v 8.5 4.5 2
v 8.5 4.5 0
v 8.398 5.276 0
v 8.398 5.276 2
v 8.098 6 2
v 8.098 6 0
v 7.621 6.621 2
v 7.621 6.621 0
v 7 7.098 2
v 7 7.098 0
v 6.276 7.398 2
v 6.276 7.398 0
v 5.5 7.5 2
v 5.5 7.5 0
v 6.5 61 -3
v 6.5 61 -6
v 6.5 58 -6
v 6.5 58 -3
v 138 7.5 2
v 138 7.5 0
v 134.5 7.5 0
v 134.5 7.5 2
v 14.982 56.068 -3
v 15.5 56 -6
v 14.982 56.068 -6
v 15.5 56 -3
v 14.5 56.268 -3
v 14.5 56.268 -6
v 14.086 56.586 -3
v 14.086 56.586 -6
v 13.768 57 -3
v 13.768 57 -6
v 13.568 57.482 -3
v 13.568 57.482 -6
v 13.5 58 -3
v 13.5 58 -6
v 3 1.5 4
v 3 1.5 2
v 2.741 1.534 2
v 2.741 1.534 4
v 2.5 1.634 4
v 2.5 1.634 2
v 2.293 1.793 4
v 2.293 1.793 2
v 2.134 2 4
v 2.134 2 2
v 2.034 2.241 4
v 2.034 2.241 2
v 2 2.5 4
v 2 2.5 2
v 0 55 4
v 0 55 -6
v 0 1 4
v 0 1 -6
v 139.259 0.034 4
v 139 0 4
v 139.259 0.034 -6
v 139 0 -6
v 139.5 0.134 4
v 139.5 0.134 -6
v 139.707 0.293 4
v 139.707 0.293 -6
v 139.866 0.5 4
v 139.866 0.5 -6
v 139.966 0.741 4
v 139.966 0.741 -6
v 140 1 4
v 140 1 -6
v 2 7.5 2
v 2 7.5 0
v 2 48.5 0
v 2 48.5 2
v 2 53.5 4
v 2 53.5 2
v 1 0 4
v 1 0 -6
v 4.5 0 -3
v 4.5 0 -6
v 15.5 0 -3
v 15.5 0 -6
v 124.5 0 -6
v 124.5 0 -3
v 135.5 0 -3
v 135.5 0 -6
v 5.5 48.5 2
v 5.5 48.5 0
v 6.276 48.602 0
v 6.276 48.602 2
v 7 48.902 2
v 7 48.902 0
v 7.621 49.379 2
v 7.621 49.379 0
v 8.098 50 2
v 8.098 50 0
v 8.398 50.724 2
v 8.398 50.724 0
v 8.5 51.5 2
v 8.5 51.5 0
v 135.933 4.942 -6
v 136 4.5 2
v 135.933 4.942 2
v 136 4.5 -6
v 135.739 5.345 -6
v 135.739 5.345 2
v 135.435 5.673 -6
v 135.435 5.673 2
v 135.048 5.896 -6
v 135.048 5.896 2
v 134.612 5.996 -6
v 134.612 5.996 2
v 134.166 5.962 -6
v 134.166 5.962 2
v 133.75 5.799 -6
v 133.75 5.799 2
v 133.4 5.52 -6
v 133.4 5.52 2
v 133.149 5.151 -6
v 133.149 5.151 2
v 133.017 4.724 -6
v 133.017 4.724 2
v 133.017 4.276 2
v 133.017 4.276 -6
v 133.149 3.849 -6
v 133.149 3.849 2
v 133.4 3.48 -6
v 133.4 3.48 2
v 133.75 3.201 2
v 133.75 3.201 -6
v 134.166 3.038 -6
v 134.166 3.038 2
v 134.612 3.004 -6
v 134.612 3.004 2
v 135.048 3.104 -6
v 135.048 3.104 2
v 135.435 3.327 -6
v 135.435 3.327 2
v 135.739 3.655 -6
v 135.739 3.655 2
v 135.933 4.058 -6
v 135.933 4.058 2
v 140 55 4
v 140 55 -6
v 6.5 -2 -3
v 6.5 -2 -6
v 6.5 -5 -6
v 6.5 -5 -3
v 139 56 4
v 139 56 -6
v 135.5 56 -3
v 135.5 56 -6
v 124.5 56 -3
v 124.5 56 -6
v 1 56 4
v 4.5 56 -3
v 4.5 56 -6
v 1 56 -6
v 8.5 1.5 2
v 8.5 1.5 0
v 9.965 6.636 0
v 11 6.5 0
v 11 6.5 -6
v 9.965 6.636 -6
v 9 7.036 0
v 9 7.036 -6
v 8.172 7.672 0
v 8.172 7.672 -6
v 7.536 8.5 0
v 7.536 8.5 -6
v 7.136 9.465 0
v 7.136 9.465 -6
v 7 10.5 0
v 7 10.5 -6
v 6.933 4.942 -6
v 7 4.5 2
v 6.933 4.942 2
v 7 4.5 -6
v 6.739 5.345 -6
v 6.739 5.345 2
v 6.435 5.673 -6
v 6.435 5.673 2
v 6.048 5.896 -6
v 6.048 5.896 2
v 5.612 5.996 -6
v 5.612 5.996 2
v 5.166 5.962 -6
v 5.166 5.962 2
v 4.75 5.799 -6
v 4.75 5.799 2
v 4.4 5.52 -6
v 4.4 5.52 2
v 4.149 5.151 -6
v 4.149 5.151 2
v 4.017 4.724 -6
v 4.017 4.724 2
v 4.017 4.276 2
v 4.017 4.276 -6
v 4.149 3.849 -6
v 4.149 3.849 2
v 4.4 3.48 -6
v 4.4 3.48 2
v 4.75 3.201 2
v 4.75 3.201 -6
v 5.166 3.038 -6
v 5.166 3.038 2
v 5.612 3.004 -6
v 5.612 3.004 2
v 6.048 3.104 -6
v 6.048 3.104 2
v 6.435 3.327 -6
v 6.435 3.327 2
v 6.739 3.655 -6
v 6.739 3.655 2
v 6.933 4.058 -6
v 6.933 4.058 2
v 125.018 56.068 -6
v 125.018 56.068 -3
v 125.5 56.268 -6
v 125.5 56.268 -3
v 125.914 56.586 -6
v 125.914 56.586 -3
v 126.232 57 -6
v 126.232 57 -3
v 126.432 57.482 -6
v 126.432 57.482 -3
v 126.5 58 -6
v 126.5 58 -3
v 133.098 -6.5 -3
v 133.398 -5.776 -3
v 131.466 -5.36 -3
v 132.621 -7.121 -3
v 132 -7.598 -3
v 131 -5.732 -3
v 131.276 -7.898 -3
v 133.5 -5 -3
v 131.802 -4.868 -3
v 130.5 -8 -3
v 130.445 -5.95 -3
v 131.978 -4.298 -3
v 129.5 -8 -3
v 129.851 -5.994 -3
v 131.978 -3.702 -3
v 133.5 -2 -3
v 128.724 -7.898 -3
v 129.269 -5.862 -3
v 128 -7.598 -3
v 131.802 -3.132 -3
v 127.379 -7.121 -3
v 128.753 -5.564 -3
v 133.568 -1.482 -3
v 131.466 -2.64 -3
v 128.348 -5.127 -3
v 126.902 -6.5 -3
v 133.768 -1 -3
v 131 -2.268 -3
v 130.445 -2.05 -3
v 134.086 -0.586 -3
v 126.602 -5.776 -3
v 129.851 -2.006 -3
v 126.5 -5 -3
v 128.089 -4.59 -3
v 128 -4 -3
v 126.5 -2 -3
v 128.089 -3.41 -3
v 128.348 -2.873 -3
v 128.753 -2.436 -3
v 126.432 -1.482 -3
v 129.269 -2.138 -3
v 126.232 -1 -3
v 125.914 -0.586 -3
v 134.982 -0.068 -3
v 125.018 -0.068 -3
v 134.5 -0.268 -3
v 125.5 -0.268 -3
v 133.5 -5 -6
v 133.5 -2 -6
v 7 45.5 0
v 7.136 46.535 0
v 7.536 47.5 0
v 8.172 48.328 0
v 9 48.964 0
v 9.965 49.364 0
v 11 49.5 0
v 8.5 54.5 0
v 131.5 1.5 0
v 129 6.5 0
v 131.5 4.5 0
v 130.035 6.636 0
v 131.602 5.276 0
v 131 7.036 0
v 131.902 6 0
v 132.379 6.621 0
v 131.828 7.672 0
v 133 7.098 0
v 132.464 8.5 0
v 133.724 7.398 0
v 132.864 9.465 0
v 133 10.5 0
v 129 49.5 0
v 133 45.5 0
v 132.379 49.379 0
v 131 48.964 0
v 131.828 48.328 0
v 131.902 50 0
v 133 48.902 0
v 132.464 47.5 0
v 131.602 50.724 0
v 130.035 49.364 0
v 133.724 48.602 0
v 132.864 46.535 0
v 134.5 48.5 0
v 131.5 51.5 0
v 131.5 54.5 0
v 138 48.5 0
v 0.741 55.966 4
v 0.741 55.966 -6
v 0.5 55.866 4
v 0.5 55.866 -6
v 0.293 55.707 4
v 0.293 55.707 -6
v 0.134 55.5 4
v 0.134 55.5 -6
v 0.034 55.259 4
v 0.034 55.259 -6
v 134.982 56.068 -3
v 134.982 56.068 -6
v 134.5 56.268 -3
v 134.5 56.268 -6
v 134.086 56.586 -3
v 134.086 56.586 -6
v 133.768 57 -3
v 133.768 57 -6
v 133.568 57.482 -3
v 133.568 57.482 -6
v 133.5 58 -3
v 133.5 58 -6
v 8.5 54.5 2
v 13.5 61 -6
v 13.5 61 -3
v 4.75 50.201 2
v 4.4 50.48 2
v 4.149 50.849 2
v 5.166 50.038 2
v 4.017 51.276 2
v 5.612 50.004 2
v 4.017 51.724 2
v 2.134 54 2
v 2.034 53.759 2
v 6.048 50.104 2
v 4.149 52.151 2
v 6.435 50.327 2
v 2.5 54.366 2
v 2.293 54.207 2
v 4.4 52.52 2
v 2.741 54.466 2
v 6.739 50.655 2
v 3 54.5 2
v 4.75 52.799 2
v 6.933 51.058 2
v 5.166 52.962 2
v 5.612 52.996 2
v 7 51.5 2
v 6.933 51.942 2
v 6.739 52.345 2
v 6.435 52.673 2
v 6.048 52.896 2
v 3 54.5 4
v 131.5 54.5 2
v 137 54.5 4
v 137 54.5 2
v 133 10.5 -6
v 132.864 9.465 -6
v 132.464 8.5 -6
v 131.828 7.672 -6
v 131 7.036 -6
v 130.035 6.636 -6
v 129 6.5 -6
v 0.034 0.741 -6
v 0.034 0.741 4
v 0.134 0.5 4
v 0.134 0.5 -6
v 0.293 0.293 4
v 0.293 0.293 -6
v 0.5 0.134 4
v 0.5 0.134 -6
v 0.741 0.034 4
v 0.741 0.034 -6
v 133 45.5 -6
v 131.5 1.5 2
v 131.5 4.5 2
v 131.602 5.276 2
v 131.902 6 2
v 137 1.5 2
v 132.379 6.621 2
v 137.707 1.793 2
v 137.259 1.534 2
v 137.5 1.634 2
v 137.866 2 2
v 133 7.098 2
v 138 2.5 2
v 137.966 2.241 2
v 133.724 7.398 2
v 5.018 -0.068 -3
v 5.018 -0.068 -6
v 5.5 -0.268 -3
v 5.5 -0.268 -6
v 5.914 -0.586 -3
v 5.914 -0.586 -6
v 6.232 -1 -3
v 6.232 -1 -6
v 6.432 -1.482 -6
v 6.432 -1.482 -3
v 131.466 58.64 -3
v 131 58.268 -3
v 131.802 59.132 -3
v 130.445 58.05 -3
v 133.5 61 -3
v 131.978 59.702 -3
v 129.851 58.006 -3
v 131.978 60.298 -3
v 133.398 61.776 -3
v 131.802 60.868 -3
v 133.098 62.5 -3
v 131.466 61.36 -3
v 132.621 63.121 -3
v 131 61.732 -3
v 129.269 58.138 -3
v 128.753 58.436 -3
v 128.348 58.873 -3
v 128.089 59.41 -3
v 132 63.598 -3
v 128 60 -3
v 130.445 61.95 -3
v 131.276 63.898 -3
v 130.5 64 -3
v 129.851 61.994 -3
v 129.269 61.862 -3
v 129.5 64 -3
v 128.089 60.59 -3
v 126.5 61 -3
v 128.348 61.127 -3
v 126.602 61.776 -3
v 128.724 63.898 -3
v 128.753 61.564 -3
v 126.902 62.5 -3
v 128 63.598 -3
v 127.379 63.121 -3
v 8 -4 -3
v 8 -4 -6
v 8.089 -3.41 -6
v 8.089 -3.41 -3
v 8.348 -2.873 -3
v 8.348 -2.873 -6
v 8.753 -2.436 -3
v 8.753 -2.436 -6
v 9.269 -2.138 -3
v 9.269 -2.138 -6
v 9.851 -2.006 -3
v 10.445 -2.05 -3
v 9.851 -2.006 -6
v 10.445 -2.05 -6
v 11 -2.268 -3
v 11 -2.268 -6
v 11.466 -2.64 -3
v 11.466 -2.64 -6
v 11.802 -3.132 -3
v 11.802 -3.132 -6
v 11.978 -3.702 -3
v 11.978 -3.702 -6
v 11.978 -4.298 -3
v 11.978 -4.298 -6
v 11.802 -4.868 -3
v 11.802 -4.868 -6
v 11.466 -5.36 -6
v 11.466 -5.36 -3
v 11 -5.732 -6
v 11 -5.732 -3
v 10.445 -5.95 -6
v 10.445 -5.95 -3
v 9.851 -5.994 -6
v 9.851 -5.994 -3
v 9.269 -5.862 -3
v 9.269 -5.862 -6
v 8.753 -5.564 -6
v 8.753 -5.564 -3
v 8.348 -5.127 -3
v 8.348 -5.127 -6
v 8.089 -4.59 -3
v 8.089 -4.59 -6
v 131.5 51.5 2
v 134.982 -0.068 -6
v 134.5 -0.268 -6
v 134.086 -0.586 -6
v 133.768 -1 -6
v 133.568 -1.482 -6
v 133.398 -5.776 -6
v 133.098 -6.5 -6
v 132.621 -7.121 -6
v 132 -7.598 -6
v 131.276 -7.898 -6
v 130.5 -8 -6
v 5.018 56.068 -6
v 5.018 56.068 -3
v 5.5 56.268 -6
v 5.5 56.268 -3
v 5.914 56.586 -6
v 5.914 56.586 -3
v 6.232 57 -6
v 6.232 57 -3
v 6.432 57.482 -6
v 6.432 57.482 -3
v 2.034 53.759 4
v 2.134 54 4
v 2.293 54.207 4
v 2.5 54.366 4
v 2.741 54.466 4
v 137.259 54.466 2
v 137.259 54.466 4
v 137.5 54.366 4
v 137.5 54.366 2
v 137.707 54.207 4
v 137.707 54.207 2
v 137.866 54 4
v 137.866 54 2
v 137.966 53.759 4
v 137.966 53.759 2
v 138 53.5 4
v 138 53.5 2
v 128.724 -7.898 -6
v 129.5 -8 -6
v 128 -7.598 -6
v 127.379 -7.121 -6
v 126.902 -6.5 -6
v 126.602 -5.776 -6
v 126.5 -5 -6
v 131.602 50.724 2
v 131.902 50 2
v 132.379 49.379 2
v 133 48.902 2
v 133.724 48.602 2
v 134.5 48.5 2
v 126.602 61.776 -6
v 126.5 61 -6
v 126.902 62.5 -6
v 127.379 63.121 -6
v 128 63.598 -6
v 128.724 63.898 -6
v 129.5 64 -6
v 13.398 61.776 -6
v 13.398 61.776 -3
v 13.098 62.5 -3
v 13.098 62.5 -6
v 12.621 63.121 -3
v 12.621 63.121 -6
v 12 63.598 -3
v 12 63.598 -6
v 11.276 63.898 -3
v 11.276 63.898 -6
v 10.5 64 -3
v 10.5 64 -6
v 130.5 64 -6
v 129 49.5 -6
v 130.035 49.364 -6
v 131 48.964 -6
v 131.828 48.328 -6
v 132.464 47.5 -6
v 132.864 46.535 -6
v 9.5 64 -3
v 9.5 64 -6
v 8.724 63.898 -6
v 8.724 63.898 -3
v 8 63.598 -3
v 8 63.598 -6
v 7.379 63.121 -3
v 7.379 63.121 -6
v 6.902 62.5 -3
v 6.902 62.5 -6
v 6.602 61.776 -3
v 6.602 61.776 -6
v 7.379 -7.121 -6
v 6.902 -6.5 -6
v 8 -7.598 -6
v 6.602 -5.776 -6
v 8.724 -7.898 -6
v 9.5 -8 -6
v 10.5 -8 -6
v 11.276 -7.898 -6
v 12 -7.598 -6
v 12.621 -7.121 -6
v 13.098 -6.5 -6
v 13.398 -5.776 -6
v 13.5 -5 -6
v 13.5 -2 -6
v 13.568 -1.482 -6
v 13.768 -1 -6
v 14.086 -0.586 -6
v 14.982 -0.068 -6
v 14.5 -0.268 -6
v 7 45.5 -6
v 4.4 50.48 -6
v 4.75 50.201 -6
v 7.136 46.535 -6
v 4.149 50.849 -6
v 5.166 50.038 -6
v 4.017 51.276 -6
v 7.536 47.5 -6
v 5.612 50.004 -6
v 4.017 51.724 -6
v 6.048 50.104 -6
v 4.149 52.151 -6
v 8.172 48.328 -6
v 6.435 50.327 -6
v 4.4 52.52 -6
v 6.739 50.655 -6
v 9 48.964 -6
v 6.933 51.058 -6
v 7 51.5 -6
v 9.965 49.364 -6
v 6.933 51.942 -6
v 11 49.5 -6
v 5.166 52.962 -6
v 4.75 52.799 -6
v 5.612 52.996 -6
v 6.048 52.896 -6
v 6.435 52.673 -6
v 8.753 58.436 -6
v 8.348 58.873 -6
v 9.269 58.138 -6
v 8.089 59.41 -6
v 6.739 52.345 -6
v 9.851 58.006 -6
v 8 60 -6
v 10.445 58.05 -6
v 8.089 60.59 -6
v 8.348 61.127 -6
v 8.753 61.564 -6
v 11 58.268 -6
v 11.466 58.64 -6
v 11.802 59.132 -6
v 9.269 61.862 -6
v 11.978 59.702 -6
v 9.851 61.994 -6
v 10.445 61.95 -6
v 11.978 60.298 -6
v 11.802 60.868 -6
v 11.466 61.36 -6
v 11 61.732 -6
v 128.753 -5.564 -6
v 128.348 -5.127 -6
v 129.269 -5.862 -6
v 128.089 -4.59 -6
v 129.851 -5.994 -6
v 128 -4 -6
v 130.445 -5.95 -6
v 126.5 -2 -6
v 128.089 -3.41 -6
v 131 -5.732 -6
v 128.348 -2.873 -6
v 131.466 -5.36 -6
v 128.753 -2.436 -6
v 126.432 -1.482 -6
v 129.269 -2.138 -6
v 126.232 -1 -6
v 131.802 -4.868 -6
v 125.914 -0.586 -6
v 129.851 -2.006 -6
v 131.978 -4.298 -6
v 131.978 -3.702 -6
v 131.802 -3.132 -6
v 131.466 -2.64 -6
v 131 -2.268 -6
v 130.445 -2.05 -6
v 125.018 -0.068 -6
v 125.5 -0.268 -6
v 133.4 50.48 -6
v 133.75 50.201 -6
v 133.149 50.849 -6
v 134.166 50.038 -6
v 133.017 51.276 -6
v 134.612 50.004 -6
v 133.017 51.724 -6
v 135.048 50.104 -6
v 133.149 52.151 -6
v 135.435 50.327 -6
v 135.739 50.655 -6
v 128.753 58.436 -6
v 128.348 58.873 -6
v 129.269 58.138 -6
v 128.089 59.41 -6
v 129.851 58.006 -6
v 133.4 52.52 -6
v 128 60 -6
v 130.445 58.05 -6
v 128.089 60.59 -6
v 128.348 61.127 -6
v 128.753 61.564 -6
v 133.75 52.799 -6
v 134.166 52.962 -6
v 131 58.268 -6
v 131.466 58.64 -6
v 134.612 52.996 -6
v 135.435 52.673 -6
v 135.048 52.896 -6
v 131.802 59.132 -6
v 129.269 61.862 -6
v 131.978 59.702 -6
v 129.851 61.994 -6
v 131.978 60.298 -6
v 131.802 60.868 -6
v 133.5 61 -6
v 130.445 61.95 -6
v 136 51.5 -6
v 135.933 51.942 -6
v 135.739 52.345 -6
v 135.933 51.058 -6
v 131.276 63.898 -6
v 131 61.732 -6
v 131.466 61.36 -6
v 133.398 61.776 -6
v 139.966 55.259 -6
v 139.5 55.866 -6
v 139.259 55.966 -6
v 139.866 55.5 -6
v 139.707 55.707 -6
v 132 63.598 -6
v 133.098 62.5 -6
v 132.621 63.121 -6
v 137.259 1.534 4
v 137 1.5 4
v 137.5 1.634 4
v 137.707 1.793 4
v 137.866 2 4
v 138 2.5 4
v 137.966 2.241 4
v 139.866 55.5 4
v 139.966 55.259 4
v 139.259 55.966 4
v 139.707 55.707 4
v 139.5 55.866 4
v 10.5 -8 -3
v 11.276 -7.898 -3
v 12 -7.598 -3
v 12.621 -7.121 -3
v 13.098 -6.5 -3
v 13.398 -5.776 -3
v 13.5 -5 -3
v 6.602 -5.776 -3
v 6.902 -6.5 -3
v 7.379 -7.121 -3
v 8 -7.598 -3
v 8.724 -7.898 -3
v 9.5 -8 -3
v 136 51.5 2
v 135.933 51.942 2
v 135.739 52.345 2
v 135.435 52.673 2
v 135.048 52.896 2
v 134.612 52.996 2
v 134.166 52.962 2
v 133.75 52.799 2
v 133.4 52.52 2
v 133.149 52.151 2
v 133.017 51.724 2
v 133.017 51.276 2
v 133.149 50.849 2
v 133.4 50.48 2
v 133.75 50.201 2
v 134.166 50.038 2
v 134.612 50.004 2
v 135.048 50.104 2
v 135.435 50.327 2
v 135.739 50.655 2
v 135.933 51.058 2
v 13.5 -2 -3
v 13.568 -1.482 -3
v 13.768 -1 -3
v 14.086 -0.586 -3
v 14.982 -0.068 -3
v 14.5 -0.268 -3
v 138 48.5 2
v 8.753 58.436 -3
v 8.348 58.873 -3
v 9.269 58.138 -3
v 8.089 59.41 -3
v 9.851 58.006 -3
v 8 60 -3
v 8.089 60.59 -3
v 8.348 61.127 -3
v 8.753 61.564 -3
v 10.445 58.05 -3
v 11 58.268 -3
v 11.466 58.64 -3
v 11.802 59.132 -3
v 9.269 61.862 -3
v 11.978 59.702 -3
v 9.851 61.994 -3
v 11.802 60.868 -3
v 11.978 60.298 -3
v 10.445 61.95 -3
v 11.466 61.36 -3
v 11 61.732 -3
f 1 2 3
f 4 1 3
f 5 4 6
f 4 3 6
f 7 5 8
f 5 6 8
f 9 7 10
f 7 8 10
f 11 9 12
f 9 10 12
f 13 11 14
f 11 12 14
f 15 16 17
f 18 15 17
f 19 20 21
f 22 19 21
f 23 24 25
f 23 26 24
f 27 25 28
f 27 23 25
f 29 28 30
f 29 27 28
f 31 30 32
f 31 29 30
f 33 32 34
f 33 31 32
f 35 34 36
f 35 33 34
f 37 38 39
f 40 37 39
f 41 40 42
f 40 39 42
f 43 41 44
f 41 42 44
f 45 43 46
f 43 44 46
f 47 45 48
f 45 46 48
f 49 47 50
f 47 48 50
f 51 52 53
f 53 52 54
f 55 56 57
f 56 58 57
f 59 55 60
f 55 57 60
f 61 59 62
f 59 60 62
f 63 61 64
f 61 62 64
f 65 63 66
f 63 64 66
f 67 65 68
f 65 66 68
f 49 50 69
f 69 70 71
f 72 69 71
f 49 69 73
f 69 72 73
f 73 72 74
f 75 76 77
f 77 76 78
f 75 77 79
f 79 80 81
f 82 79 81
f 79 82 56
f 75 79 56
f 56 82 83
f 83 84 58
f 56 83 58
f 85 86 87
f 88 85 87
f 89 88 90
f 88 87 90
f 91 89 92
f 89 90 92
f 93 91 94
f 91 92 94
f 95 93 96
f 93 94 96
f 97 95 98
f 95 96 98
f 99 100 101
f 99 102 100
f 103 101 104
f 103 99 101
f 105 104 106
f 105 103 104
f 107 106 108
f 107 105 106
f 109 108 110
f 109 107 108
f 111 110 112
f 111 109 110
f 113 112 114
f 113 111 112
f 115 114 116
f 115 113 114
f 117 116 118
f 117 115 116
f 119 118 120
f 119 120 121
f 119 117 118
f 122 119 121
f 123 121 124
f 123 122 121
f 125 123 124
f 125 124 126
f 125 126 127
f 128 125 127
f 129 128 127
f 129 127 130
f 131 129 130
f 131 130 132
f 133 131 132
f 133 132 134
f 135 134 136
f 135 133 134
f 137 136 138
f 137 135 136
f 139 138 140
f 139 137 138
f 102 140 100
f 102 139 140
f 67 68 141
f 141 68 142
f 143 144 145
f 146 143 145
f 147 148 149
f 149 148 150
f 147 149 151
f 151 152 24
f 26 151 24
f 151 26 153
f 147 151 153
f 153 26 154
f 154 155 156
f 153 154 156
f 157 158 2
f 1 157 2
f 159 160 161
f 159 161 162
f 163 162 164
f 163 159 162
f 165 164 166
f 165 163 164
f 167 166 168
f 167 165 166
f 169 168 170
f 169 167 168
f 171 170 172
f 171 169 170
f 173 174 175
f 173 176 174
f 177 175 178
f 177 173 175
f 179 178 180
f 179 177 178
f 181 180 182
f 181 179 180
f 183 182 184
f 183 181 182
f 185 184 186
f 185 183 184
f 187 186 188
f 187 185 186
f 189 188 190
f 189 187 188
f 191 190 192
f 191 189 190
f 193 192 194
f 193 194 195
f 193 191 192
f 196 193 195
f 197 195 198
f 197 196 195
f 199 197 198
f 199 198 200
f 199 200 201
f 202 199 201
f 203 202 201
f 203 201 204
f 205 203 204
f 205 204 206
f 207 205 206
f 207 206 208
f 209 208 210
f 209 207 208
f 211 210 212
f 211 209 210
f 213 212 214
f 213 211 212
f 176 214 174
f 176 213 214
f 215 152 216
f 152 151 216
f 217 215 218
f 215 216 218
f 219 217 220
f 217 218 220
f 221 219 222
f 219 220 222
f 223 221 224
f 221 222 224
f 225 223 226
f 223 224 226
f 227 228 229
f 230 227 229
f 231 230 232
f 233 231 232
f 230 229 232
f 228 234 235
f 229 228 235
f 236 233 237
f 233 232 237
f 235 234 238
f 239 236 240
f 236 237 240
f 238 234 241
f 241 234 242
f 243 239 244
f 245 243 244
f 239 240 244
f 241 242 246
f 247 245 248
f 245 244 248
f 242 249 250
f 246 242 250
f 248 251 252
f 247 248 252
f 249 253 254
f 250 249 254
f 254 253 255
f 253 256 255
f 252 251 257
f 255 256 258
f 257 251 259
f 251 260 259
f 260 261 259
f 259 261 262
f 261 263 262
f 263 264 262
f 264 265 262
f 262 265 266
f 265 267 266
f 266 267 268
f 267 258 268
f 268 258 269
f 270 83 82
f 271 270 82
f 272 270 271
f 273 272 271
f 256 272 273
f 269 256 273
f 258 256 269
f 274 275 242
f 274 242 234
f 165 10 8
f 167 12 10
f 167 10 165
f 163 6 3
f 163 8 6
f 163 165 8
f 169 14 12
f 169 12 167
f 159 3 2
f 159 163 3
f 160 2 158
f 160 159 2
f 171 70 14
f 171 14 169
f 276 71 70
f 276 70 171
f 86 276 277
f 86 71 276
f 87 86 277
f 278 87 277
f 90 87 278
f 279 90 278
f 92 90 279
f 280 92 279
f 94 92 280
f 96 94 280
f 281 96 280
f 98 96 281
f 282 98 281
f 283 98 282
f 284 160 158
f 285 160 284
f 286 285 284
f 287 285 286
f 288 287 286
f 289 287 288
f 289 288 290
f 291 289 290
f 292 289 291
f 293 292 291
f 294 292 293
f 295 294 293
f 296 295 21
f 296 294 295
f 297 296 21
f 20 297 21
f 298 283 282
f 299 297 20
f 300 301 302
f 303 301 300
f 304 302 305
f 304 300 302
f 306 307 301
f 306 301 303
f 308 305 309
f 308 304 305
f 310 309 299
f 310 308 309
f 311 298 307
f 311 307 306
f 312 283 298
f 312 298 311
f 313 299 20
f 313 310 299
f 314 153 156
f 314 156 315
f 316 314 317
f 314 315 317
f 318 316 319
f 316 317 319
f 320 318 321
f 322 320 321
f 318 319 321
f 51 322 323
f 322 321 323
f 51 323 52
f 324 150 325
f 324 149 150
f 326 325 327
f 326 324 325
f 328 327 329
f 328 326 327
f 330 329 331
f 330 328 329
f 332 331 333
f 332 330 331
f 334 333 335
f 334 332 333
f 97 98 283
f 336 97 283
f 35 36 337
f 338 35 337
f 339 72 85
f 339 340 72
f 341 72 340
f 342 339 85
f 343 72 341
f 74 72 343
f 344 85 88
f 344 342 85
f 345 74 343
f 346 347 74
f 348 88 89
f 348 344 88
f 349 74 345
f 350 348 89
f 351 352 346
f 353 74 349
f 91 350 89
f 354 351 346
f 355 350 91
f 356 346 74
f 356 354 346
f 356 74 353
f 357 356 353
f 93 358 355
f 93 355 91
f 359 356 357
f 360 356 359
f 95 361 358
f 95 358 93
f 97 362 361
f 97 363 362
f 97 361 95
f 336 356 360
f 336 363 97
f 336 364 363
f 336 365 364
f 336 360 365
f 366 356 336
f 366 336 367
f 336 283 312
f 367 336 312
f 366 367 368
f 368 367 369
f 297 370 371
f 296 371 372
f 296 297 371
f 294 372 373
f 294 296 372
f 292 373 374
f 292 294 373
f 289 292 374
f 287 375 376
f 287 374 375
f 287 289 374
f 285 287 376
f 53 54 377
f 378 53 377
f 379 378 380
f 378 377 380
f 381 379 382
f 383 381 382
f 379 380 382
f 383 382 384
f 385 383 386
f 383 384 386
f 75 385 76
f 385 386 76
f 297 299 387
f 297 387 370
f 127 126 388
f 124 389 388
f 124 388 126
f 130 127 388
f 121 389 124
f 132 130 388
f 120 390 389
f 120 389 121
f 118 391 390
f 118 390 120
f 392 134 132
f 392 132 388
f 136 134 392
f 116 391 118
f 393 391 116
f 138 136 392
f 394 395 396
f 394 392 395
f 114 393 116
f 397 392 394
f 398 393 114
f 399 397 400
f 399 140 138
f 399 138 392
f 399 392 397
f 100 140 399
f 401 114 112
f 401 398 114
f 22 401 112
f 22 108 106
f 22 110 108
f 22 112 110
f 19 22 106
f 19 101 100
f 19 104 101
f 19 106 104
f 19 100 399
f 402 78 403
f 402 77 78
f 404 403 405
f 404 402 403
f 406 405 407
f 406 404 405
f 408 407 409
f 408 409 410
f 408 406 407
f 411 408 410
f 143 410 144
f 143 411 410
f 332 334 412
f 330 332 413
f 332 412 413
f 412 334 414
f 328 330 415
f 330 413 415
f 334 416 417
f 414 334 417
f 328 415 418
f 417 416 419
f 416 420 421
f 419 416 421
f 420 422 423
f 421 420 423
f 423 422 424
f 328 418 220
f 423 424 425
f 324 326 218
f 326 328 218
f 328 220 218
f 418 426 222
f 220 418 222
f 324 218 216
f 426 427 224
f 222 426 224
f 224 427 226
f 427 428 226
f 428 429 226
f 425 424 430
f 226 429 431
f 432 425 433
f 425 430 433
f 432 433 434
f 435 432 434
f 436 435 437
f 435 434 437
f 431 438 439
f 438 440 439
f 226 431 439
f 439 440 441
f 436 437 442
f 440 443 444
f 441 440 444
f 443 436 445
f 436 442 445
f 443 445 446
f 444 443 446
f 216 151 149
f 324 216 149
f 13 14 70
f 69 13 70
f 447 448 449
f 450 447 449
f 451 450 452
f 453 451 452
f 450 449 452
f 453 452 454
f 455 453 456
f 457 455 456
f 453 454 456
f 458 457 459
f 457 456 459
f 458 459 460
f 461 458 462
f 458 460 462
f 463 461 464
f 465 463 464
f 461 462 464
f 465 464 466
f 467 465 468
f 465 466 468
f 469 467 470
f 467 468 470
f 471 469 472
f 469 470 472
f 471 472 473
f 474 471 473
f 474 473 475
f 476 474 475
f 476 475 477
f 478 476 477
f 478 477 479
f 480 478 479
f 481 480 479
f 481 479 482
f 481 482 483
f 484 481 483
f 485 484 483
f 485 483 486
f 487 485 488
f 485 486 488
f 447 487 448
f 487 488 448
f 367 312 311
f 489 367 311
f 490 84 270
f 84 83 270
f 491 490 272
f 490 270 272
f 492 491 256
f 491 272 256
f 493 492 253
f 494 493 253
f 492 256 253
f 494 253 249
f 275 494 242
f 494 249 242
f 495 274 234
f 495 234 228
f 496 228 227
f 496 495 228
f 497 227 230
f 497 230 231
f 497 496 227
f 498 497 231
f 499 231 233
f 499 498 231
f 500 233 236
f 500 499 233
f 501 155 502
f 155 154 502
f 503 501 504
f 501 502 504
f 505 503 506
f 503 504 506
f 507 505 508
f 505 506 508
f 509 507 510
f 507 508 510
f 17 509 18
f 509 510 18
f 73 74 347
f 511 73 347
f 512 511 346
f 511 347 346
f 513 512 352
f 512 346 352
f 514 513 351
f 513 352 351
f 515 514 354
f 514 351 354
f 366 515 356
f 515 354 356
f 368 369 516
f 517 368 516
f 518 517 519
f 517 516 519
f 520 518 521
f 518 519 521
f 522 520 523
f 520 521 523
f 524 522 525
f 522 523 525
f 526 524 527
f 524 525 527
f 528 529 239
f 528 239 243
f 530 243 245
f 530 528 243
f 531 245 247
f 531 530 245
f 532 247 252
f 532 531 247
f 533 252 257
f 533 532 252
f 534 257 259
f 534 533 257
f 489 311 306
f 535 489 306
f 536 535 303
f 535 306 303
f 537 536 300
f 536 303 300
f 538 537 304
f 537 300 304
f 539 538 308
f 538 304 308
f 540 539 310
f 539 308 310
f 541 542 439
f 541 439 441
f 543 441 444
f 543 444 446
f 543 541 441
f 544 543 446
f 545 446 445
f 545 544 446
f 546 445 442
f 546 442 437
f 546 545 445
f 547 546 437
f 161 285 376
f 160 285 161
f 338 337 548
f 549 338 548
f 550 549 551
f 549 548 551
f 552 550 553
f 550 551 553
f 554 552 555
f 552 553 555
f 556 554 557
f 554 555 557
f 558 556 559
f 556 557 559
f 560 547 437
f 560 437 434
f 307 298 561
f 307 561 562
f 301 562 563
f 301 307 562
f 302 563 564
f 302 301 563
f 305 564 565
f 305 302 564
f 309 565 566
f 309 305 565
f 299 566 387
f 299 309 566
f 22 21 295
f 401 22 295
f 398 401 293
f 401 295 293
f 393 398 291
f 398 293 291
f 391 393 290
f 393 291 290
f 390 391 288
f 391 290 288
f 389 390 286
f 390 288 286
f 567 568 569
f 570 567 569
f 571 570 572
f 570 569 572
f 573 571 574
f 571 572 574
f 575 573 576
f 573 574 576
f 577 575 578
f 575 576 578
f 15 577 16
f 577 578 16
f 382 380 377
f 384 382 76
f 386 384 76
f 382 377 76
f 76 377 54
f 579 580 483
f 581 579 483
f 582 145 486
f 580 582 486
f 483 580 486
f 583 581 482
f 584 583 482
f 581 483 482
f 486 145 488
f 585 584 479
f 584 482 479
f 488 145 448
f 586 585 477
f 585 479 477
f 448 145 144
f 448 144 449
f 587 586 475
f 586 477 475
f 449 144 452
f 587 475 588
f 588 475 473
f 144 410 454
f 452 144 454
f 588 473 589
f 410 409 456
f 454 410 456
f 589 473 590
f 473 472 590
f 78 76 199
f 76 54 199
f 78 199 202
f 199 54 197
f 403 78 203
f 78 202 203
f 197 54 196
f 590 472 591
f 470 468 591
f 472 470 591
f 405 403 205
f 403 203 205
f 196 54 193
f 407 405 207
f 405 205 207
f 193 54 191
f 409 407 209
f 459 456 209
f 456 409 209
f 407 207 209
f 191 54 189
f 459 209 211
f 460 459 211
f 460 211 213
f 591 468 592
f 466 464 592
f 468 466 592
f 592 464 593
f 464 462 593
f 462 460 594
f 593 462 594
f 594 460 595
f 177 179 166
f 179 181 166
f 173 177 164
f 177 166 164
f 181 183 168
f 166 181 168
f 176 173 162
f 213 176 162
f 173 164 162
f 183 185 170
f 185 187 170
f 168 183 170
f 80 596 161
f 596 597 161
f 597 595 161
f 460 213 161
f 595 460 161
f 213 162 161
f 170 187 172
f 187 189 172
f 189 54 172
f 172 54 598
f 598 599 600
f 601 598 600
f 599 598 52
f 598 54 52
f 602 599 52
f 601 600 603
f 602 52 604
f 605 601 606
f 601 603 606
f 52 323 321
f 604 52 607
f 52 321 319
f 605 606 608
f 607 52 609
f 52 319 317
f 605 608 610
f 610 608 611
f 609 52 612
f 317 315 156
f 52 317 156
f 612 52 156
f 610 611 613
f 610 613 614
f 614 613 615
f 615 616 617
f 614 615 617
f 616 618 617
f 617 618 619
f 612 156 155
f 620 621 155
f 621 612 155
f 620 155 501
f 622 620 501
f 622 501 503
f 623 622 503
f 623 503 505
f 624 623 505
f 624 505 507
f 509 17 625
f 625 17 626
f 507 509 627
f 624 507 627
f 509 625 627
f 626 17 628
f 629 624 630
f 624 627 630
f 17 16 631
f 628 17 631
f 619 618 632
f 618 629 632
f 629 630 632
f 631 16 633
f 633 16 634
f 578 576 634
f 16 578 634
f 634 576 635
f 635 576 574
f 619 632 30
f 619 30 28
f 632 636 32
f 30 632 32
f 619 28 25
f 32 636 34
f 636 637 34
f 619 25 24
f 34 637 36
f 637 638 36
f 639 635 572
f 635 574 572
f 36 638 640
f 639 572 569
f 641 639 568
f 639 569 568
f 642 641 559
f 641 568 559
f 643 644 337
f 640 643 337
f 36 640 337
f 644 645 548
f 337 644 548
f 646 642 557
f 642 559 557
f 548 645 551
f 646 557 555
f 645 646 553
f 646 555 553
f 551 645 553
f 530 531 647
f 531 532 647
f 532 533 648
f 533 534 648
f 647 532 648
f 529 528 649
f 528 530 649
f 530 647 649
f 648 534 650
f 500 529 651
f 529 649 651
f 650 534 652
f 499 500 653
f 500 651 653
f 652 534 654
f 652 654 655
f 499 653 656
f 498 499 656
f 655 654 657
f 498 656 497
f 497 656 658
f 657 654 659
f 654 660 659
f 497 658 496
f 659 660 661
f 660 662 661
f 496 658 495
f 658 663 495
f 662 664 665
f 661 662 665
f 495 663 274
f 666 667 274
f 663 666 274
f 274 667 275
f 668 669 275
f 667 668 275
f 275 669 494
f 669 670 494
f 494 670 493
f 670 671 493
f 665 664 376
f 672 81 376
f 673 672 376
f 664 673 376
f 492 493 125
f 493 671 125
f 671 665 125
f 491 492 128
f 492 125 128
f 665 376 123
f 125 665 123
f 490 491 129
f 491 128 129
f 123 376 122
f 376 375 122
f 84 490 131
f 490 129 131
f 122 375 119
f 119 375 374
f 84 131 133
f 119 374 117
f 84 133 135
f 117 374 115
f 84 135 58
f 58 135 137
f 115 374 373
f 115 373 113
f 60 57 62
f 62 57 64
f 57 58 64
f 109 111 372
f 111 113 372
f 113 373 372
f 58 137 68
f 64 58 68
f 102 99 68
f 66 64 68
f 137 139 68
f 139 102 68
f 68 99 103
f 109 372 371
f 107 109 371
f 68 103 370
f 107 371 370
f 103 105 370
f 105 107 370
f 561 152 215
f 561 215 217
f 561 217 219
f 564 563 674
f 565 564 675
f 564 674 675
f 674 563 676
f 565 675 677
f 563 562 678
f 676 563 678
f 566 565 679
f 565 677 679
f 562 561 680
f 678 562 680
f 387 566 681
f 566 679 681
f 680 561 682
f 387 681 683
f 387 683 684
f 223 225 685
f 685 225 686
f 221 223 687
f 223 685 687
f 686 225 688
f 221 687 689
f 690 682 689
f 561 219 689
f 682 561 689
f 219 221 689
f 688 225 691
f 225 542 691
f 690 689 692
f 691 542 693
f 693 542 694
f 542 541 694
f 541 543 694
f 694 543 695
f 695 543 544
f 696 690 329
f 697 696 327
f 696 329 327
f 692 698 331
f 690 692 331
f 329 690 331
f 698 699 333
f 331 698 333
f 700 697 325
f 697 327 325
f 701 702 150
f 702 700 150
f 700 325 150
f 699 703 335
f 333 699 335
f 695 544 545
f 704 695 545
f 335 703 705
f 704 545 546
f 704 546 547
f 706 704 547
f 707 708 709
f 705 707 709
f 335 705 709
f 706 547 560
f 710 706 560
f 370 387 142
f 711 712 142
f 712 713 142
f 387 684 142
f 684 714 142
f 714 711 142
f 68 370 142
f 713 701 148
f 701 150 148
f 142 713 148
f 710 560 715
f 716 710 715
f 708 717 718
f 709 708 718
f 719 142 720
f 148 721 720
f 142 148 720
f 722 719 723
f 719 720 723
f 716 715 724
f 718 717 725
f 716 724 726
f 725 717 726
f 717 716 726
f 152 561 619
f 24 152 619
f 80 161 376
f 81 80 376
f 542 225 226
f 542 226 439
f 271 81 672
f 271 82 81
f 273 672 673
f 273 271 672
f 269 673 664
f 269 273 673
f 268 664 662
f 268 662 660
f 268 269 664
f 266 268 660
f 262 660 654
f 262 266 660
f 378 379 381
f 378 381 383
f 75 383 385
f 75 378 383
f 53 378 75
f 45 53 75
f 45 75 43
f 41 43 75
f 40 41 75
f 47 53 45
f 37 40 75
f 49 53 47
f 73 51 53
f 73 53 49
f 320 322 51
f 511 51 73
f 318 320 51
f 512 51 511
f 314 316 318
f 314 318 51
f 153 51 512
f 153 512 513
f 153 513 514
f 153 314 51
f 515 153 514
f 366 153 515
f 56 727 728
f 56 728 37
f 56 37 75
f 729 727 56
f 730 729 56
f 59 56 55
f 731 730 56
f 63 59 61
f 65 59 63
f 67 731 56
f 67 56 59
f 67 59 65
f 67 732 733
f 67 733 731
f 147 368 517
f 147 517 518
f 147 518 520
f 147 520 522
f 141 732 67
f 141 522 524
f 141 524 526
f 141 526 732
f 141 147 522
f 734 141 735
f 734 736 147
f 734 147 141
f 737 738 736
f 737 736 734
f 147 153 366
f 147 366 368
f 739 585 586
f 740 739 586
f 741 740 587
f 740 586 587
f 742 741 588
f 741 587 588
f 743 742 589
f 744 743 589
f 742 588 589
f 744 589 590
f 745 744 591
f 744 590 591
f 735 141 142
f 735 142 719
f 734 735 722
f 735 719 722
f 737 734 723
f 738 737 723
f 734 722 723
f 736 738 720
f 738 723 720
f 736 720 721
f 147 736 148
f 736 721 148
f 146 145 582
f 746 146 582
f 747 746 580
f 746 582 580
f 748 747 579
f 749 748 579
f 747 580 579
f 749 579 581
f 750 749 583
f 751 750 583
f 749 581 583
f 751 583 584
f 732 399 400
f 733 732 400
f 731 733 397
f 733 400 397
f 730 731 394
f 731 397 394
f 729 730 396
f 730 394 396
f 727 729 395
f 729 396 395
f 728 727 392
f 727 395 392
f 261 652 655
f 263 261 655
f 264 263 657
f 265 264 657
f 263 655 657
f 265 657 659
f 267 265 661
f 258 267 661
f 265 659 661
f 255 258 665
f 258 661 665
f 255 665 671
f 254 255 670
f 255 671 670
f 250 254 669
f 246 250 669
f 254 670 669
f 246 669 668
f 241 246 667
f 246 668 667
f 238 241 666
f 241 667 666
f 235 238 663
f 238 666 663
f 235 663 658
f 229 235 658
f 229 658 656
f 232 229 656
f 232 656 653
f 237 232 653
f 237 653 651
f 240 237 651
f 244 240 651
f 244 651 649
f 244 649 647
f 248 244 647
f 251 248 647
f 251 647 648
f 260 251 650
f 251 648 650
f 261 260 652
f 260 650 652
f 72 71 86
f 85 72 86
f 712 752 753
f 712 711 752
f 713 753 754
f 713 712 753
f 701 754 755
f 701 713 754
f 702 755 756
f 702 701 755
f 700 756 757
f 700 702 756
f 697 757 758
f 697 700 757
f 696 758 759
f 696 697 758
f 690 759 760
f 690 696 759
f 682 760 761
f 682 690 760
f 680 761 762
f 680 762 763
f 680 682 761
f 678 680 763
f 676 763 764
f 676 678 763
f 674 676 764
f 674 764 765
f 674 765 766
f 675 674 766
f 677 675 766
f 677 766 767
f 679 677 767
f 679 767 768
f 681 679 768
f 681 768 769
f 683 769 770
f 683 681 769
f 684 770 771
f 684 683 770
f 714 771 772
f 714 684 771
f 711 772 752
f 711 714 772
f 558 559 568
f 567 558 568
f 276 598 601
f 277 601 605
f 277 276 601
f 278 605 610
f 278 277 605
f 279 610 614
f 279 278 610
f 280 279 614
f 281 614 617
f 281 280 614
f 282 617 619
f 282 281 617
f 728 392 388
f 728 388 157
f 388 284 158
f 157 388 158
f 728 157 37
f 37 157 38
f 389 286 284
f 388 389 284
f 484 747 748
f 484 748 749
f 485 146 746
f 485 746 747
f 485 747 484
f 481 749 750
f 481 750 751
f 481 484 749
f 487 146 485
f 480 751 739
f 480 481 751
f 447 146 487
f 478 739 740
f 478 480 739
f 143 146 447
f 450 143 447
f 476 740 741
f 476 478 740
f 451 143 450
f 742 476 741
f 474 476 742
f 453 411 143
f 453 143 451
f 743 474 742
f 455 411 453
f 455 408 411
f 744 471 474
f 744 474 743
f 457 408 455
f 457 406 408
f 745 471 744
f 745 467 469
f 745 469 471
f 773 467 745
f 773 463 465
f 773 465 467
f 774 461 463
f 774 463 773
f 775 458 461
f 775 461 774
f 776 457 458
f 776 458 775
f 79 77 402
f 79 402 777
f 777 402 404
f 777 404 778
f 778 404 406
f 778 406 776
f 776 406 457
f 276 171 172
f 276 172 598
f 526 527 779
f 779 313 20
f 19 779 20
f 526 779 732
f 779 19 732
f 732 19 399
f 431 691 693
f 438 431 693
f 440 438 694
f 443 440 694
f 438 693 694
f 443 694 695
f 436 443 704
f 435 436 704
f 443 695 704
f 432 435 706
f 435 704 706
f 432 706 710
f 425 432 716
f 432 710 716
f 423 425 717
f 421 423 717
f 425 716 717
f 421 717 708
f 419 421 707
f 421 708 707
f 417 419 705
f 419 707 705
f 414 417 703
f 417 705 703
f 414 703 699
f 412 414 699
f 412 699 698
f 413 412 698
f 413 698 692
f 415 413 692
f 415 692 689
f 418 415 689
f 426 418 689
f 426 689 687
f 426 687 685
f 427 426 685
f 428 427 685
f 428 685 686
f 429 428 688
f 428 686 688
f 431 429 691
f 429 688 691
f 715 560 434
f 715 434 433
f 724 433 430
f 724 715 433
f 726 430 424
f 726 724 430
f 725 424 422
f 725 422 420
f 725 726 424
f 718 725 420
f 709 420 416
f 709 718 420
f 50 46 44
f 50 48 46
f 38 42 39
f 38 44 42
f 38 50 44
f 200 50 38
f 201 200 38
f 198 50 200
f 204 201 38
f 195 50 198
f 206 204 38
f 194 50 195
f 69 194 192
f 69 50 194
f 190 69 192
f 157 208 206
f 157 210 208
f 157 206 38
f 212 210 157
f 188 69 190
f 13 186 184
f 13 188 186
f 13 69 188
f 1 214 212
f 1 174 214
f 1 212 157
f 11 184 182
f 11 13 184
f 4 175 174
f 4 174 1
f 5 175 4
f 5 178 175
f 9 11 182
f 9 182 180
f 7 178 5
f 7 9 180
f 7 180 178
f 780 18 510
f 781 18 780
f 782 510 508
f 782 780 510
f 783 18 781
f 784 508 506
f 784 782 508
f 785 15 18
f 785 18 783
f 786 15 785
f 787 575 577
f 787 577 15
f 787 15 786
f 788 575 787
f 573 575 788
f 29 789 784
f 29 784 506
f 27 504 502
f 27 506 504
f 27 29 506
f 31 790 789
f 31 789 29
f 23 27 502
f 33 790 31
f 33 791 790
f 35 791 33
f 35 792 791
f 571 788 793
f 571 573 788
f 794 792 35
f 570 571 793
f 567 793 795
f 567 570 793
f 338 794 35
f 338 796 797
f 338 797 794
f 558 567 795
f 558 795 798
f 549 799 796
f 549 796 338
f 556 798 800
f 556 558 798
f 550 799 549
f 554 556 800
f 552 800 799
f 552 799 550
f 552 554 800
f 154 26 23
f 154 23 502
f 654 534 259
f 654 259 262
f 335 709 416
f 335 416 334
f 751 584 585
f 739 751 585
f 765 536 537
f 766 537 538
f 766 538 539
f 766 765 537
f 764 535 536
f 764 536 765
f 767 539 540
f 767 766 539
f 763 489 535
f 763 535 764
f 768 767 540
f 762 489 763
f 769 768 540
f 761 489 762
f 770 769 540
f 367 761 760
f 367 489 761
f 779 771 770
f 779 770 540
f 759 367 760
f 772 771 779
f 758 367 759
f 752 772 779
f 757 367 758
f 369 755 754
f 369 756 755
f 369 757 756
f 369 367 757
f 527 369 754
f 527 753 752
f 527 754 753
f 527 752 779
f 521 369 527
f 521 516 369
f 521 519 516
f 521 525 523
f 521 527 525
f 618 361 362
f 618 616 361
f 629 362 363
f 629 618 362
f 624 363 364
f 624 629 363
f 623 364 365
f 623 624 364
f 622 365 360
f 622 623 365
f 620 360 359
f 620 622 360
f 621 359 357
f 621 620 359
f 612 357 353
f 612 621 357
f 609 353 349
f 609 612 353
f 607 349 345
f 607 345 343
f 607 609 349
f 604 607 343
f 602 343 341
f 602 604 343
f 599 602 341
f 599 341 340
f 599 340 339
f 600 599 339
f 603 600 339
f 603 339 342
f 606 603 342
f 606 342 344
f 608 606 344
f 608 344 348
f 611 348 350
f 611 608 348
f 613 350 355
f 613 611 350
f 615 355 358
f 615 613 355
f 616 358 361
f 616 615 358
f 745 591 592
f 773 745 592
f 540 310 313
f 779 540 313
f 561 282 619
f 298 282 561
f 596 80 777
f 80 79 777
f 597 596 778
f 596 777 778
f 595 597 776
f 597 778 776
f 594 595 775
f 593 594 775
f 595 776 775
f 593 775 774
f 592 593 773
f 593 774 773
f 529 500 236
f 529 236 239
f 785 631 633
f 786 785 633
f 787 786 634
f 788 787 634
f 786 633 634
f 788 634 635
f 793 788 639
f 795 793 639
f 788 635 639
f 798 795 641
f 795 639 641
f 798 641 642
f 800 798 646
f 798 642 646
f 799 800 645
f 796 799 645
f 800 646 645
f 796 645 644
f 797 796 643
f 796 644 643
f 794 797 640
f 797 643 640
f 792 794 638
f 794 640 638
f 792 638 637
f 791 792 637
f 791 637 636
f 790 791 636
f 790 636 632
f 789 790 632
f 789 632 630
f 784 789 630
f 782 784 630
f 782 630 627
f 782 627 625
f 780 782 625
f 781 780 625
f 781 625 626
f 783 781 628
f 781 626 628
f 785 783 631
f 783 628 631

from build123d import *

# Parameters (mm, degrees)
SKETCH1_R               = 1.5
BOSS_EXTRUDE1_DEPTH     = 6
BOSS_EXTRUDE2_DEPTH     = 4
CUT_EXTRUDE1_DEPTH      = 5
CUT_EXTRUDE1_DEPTH_BACK = 7
SKETCH3_R               = 2
BOSS_EXTRUDE3_DEPTH     = 3
FILLET1_R               = 2
SKETCH4_R               = 1.5
BOSS_EXTRUDE4_DEPTH     = 2


with BuildPart() as part:
    # Sketch1 → Boss-Extrude1 (new body)
    with BuildSketch(Plane.XY):
        with BuildLine():
            Line((1, 0), (139, 0))
            ThreePointArc((139, 0), (139.707106781, 0.292893219), (140, 1))
            Line((140, 1), (140, 55))
            ThreePointArc((140, 55), (139.707106781, 55.707106781), (139, 56))
            Line((139, 56), (1, 56))
            ThreePointArc((1, 56), (0.292893219, 55.707106781), (0, 55))
            Line((0, 55), (0, 1))
            ThreePointArc((0, 1), (0.292893219, 0.292893219), (1, 0))
        make_face()
        with Locations((5.5, 51.5)):
            Circle(SKETCH1_R, mode=Mode.SUBTRACT)
        with Locations((5.5, 4.5)):
            Circle(SKETCH1_R, mode=Mode.SUBTRACT)
        with Locations((134.5, 4.5)):
            Circle(SKETCH1_R, mode=Mode.SUBTRACT)
        with Locations((134.5, 51.5)):
            Circle(SKETCH1_R, mode=Mode.SUBTRACT)
    extrude(amount=-BOSS_EXTRUDE1_DEPTH)

    # Sketch1<3> → Boss-Extrude2 (add)
    with BuildSketch(Plane.XY):
        with BuildLine():
            ThreePointArc((0, 1), (0.292893219, 0.292893219), (1, 0))
            Line((1, 0), (139, 0))
            ThreePointArc((139, 0), (139.707106781, 0.292893219), (140, 1))
            Line((140, 1), (140, 55))
            ThreePointArc((140, 55), (139.707106781, 55.707106781), (139, 56))
            Line((139, 56), (1, 56))
            ThreePointArc((1, 56), (0.292893219, 55.707106781), (0, 55))
            Line((0, 55), (0, 1))
        make_face()
        with BuildLine():
            ThreePointArc((2, 53.5), (2.292893219, 54.207106781), (3, 54.5))
            Line((3, 54.5), (137, 54.5))
            ThreePointArc((137, 54.5), (137.707106781, 54.207106781), (138, 53.5))
            Line((138, 53.5), (138, 2.5))
            ThreePointArc((138, 2.5), (137.707106781, 1.792893219), (137, 1.5))
            Line((137, 1.5), (3, 1.5))
            ThreePointArc((3, 1.5), (2.292893219, 1.792893219), (2, 2.5))
            Line((2, 2.5), (2, 53.5))
        make_face(mode=Mode.SUBTRACT)
    extrude(amount=BOSS_EXTRUDE2_DEPTH)

    # Sketch2 → Cut-Extrude1 (cut, two sides)
    with BuildSketch(Plane.XY) as cut_extrude1_sk:
        with BuildLine():
            Line((11, 49.5), (129, 49.5))
            ThreePointArc((129, 49.5), (131.828427125, 48.328427125), (133, 45.5))
            Line((133, 45.5), (133, 10.5))
            ThreePointArc((133, 10.5), (131.828427125, 7.671572875), (129, 6.5))
            Line((129, 6.5), (11, 6.5))
            ThreePointArc((11, 6.5), (8.171572875, 7.671572875), (7, 10.5))
            Line((7, 10.5), (7, 45.5))
            ThreePointArc((7, 45.5), (8.171572875, 48.328427125), (11, 49.5))
        make_face()
    extrude(amount=CUT_EXTRUDE1_DEPTH, mode=Mode.SUBTRACT)
    extrude(cut_extrude1_sk.sketch, amount=-CUT_EXTRUDE1_DEPTH_BACK, mode=Mode.SUBTRACT)

    # Sketch3 → Boss-Extrude3 (add)
    with BuildSketch(Plane(origin=(0, 0, -6), x_dir=(-1, 0, 0), z_dir=(0, 0, -1))):
        with BuildLine():
            Line((-6.5, 0), (-6.5, -5))
            ThreePointArc((-6.5, -5), (-7.378679656, -7.121320344), (-9.5, -8))
            Line((-9.5, -8), (-10.5, -8))
            ThreePointArc((-10.5, -8), (-12.621320344, -7.121320344), (-13.5, -5))
            Line((-13.5, -5), (-13.5, 0))
            Line((-13.5, 0), (-6.5, 0))
        make_face()
        with Locations((-10, -4)):
            Circle(SKETCH3_R, mode=Mode.SUBTRACT)
        with BuildLine():
            Line((-6.5, 56), (-13.5, 56))
            Line((-13.5, 56), (-13.5, 61))
            ThreePointArc((-13.5, 61), (-12.621320344, 63.121320344), (-10.5, 64))
            Line((-10.5, 64), (-9.5, 64))
            ThreePointArc((-9.5, 64), (-7.378679656, 63.121320344), (-6.5, 61))
            Line((-6.5, 61), (-6.5, 56))
        make_face()
        with Locations((-10, 60)):
            Circle(SKETCH3_R, mode=Mode.SUBTRACT)
        with BuildLine():
            Line((-126.5, 56), (-126.5, 61))
            ThreePointArc((-126.5, 61), (-127.378679656, 63.121320344), (-129.5, 64))
            Line((-129.5, 64), (-130.5, 64))
            ThreePointArc((-130.5, 64), (-132.621320344, 63.121320344), (-133.5, 61))
            Line((-133.5, 61), (-133.5, 56))
            Line((-133.5, 56), (-126.5, 56))
        make_face()
        with Locations((-130, 60)):
            Circle(SKETCH3_R, mode=Mode.SUBTRACT)
        with BuildLine():
            Line((-133.5, 0), (-133.5, -5))
            ThreePointArc((-133.5, -5), (-132.621320344, -7.121320344), (-130.5, -8))
            Line((-130.5, -8), (-129.5, -8))
            ThreePointArc((-129.5, -8), (-127.378679656, -7.121320344), (-126.5, -5))
            Line((-126.5, -5), (-126.5, 0))
            Line((-126.5, 0), (-133.5, 0))
        make_face()
        with Locations((-130, -4)):
            Circle(SKETCH3_R, mode=Mode.SUBTRACT)
    extrude(amount=-BOSS_EXTRUDE3_DEPTH)

    # Fillet1
    fillet1_edges = [part.edges().sort_by_distance(p)[0] for p in [
        (13.5, 0, -4.5),
        (6.5, 0, -4.5),
        (6.5, 56, -4.5),
        (13.5, 56, -4.5),
        (126.5, 56, -4.5),
        (133.5, 56, -4.5),
        (133.5, 0, -4.5),
        (126.5, 0, -4.5),
    ]]
    fillet(fillet1_edges, radius=FILLET1_R)

    # Sketch4 → Boss-Extrude4 (add)
    with BuildSketch(Plane.XY):
        with BuildLine():
            Line((8.5, 51.5), (8.5, 54.880942349))
            Line((8.5, 54.880942349), (6, 54.880942349))
            Line((6, 54.880942349), (1.461490173, 54.880942349))
            Line((1.461490173, 54.880942349), (1.461490173, 48.5))
            Line((1.461490173, 48.5), (5.5, 48.5))
            ThreePointArc((5.5, 48.5), (7.621320344, 49.378679656), (8.5, 51.5))
        make_face()
        with Locations((5.5, 51.5)):
            Circle(SKETCH4_R, mode=Mode.SUBTRACT)
        with BuildLine():
            Line((134, 54.880942349), (131.5, 54.880942349))
            Line((131.5, 54.880942349), (131.5, 51.5))
            ThreePointArc((131.5, 51.5), (132.378679656, 49.378679656), (134.5, 48.5))
            Line((134.5, 48.5), (138.538509827, 48.5))
            Line((138.538509827, 48.5), (138.538509827, 54.880942349))
            Line((138.538509827, 54.880942349), (134, 54.880942349))
        make_face()
        with Locations((134.5, 51.5)):
            Circle(SKETCH4_R, mode=Mode.SUBTRACT)
        with BuildLine():
            Line((131.5, 4.5), (131.5, 1.119057651))
            Line((131.5, 1.119057651), (134, 1.119057651))
            Line((134, 1.119057651), (138.538509827, 1.119057651))
            Line((138.538509827, 1.119057651), (138.538509827, 7.5))
            Line((138.538509827, 7.5), (134.5, 7.5))
            ThreePointArc((134.5, 7.5), (132.378679656, 6.621320344), (131.5, 4.5))
        make_face()
        with Locations((134.5, 4.5)):
            Circle(SKETCH4_R, mode=Mode.SUBTRACT)
        with BuildLine():
            Line((6, 1.119057651), (8.5, 1.119057651))
            Line((8.5, 1.119057651), (8.5, 4.5))
            ThreePointArc((8.5, 4.5), (7.621320344, 6.621320344), (5.5, 7.5))
            Line((5.5, 7.5), (1.461490173, 7.5))
            Line((1.461490173, 7.5), (1.461490173, 1.119057651))
            Line((1.461490173, 1.119057651), (6, 1.119057651))
        make_face()
        with Locations((5.5, 4.5)):
            Circle(SKETCH4_R, mode=Mode.SUBTRACT)
    extrude(amount=BOSS_EXTRUDE4_DEPTH)


solid = part.part
